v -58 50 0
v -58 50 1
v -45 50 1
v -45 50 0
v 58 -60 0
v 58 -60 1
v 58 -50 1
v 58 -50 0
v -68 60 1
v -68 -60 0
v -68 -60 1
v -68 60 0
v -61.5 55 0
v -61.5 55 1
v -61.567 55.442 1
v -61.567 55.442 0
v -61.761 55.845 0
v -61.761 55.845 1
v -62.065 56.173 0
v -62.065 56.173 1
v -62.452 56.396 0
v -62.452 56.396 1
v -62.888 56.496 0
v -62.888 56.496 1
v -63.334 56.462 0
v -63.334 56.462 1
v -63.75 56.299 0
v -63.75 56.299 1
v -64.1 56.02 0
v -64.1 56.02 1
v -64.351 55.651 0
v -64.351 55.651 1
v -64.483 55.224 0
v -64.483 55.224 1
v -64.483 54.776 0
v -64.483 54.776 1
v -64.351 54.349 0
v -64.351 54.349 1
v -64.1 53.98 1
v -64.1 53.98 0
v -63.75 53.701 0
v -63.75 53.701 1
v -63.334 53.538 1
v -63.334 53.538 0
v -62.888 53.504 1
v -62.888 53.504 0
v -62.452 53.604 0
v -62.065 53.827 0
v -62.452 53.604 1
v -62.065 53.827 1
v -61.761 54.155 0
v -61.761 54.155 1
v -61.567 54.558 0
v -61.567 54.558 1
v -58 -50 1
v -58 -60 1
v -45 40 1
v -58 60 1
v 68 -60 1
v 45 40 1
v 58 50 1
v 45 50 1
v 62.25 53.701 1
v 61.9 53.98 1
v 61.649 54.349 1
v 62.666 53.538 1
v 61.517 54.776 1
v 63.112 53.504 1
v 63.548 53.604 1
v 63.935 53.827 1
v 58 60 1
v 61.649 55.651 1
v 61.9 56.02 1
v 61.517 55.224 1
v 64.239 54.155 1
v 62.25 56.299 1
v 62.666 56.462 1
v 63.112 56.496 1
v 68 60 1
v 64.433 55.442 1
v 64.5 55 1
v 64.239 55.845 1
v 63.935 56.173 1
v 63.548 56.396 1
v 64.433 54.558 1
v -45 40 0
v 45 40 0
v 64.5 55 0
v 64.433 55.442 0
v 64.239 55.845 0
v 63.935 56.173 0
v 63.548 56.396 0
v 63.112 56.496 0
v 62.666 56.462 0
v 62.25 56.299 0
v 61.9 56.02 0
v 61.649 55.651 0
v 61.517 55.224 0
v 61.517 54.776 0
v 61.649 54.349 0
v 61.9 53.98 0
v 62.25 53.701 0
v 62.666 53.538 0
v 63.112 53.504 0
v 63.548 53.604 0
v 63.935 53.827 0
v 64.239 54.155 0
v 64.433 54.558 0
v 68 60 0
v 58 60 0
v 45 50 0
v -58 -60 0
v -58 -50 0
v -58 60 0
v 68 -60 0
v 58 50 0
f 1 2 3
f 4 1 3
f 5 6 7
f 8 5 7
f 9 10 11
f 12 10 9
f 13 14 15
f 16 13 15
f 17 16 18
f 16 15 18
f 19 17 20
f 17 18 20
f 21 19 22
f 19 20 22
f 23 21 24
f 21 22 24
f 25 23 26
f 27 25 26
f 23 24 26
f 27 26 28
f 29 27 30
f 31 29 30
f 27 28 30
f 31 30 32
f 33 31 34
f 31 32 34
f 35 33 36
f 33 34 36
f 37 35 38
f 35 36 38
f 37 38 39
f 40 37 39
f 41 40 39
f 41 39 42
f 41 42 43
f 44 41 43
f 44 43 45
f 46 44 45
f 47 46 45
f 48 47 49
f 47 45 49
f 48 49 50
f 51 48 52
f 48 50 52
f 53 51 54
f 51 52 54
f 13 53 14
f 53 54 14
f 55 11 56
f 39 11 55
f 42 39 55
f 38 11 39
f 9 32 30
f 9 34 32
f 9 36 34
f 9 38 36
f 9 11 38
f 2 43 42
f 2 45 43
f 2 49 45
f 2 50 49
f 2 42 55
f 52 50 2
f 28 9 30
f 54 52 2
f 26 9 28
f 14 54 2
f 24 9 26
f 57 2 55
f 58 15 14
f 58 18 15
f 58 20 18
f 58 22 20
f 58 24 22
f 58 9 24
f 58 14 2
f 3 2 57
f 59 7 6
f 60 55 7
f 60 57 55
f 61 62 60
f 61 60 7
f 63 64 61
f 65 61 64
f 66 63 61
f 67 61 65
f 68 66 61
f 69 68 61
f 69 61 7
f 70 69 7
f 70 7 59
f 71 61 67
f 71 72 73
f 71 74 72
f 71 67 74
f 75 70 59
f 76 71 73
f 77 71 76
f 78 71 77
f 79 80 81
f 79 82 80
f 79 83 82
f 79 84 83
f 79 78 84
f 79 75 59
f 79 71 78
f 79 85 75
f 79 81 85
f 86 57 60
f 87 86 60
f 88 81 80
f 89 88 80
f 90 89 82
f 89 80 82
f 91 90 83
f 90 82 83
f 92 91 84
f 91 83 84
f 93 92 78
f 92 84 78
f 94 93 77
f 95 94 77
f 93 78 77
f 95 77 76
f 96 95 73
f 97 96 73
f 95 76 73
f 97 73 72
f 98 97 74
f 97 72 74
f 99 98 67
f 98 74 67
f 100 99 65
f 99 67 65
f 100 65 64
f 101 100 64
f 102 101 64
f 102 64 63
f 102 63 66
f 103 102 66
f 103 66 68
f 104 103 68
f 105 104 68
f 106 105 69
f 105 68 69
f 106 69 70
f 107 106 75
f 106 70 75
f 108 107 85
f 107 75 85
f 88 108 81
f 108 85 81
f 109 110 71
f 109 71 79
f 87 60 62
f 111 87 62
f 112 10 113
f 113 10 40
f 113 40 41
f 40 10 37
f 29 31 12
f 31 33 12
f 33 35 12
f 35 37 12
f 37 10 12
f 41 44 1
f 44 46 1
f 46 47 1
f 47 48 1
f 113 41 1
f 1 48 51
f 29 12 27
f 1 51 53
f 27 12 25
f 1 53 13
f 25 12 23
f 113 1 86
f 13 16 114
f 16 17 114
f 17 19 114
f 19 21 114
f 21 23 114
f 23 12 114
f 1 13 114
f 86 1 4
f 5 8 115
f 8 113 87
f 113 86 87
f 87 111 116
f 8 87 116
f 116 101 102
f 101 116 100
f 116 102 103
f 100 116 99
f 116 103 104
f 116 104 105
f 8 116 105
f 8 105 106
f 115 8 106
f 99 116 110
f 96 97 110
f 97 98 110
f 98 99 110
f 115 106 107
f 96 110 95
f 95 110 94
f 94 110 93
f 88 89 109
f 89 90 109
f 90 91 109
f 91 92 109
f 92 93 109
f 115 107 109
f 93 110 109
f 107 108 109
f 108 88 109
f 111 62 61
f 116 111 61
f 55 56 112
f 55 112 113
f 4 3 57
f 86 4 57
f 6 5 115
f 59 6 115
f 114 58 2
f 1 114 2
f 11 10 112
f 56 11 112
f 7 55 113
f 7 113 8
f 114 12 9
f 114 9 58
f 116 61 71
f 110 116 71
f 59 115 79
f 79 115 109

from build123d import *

# Parameters (mm, degrees)
F0_W     = 136
F0_H     = 120
F1_DEPTH = 1
F2_W     = 116
F2_H     = 10
F3_DEPTH = 1
F4_R     = 1.5
F5_DEPTH = 1


with BuildPart() as f1:
    # F0 (on Top) → F1 (new body)
    with BuildSketch(Plane.XY):
        Rectangle(F0_W, F0_H)
    extrude(amount=F1_DEPTH)

    # F2 (on face) → F3 (cut, through all)
    with BuildSketch(Plane.XY.offset(1)):
        Polygon((58, 60), (-58, 60), (-58, 50), (-45, 50), (-45, 40), (0, 40), (45, 40), (45, 50), (58, 50), align=None)
        with Locations((0, -55)):
            Rectangle(F2_W, F2_H)
    extrude(amount=-F3_DEPTH, mode=Mode.SUBTRACT)

    # F4 (on face) → F5 (cut, through all)
    with BuildSketch(Plane.XY.offset(1)):
        with Locations((-63, 55)):
            Circle(F4_R)
        with Locations((63, 55)):
            Circle(F4_R)
    extrude(amount=-F5_DEPTH, mode=Mode.SUBTRACT)


solid = f1.part
